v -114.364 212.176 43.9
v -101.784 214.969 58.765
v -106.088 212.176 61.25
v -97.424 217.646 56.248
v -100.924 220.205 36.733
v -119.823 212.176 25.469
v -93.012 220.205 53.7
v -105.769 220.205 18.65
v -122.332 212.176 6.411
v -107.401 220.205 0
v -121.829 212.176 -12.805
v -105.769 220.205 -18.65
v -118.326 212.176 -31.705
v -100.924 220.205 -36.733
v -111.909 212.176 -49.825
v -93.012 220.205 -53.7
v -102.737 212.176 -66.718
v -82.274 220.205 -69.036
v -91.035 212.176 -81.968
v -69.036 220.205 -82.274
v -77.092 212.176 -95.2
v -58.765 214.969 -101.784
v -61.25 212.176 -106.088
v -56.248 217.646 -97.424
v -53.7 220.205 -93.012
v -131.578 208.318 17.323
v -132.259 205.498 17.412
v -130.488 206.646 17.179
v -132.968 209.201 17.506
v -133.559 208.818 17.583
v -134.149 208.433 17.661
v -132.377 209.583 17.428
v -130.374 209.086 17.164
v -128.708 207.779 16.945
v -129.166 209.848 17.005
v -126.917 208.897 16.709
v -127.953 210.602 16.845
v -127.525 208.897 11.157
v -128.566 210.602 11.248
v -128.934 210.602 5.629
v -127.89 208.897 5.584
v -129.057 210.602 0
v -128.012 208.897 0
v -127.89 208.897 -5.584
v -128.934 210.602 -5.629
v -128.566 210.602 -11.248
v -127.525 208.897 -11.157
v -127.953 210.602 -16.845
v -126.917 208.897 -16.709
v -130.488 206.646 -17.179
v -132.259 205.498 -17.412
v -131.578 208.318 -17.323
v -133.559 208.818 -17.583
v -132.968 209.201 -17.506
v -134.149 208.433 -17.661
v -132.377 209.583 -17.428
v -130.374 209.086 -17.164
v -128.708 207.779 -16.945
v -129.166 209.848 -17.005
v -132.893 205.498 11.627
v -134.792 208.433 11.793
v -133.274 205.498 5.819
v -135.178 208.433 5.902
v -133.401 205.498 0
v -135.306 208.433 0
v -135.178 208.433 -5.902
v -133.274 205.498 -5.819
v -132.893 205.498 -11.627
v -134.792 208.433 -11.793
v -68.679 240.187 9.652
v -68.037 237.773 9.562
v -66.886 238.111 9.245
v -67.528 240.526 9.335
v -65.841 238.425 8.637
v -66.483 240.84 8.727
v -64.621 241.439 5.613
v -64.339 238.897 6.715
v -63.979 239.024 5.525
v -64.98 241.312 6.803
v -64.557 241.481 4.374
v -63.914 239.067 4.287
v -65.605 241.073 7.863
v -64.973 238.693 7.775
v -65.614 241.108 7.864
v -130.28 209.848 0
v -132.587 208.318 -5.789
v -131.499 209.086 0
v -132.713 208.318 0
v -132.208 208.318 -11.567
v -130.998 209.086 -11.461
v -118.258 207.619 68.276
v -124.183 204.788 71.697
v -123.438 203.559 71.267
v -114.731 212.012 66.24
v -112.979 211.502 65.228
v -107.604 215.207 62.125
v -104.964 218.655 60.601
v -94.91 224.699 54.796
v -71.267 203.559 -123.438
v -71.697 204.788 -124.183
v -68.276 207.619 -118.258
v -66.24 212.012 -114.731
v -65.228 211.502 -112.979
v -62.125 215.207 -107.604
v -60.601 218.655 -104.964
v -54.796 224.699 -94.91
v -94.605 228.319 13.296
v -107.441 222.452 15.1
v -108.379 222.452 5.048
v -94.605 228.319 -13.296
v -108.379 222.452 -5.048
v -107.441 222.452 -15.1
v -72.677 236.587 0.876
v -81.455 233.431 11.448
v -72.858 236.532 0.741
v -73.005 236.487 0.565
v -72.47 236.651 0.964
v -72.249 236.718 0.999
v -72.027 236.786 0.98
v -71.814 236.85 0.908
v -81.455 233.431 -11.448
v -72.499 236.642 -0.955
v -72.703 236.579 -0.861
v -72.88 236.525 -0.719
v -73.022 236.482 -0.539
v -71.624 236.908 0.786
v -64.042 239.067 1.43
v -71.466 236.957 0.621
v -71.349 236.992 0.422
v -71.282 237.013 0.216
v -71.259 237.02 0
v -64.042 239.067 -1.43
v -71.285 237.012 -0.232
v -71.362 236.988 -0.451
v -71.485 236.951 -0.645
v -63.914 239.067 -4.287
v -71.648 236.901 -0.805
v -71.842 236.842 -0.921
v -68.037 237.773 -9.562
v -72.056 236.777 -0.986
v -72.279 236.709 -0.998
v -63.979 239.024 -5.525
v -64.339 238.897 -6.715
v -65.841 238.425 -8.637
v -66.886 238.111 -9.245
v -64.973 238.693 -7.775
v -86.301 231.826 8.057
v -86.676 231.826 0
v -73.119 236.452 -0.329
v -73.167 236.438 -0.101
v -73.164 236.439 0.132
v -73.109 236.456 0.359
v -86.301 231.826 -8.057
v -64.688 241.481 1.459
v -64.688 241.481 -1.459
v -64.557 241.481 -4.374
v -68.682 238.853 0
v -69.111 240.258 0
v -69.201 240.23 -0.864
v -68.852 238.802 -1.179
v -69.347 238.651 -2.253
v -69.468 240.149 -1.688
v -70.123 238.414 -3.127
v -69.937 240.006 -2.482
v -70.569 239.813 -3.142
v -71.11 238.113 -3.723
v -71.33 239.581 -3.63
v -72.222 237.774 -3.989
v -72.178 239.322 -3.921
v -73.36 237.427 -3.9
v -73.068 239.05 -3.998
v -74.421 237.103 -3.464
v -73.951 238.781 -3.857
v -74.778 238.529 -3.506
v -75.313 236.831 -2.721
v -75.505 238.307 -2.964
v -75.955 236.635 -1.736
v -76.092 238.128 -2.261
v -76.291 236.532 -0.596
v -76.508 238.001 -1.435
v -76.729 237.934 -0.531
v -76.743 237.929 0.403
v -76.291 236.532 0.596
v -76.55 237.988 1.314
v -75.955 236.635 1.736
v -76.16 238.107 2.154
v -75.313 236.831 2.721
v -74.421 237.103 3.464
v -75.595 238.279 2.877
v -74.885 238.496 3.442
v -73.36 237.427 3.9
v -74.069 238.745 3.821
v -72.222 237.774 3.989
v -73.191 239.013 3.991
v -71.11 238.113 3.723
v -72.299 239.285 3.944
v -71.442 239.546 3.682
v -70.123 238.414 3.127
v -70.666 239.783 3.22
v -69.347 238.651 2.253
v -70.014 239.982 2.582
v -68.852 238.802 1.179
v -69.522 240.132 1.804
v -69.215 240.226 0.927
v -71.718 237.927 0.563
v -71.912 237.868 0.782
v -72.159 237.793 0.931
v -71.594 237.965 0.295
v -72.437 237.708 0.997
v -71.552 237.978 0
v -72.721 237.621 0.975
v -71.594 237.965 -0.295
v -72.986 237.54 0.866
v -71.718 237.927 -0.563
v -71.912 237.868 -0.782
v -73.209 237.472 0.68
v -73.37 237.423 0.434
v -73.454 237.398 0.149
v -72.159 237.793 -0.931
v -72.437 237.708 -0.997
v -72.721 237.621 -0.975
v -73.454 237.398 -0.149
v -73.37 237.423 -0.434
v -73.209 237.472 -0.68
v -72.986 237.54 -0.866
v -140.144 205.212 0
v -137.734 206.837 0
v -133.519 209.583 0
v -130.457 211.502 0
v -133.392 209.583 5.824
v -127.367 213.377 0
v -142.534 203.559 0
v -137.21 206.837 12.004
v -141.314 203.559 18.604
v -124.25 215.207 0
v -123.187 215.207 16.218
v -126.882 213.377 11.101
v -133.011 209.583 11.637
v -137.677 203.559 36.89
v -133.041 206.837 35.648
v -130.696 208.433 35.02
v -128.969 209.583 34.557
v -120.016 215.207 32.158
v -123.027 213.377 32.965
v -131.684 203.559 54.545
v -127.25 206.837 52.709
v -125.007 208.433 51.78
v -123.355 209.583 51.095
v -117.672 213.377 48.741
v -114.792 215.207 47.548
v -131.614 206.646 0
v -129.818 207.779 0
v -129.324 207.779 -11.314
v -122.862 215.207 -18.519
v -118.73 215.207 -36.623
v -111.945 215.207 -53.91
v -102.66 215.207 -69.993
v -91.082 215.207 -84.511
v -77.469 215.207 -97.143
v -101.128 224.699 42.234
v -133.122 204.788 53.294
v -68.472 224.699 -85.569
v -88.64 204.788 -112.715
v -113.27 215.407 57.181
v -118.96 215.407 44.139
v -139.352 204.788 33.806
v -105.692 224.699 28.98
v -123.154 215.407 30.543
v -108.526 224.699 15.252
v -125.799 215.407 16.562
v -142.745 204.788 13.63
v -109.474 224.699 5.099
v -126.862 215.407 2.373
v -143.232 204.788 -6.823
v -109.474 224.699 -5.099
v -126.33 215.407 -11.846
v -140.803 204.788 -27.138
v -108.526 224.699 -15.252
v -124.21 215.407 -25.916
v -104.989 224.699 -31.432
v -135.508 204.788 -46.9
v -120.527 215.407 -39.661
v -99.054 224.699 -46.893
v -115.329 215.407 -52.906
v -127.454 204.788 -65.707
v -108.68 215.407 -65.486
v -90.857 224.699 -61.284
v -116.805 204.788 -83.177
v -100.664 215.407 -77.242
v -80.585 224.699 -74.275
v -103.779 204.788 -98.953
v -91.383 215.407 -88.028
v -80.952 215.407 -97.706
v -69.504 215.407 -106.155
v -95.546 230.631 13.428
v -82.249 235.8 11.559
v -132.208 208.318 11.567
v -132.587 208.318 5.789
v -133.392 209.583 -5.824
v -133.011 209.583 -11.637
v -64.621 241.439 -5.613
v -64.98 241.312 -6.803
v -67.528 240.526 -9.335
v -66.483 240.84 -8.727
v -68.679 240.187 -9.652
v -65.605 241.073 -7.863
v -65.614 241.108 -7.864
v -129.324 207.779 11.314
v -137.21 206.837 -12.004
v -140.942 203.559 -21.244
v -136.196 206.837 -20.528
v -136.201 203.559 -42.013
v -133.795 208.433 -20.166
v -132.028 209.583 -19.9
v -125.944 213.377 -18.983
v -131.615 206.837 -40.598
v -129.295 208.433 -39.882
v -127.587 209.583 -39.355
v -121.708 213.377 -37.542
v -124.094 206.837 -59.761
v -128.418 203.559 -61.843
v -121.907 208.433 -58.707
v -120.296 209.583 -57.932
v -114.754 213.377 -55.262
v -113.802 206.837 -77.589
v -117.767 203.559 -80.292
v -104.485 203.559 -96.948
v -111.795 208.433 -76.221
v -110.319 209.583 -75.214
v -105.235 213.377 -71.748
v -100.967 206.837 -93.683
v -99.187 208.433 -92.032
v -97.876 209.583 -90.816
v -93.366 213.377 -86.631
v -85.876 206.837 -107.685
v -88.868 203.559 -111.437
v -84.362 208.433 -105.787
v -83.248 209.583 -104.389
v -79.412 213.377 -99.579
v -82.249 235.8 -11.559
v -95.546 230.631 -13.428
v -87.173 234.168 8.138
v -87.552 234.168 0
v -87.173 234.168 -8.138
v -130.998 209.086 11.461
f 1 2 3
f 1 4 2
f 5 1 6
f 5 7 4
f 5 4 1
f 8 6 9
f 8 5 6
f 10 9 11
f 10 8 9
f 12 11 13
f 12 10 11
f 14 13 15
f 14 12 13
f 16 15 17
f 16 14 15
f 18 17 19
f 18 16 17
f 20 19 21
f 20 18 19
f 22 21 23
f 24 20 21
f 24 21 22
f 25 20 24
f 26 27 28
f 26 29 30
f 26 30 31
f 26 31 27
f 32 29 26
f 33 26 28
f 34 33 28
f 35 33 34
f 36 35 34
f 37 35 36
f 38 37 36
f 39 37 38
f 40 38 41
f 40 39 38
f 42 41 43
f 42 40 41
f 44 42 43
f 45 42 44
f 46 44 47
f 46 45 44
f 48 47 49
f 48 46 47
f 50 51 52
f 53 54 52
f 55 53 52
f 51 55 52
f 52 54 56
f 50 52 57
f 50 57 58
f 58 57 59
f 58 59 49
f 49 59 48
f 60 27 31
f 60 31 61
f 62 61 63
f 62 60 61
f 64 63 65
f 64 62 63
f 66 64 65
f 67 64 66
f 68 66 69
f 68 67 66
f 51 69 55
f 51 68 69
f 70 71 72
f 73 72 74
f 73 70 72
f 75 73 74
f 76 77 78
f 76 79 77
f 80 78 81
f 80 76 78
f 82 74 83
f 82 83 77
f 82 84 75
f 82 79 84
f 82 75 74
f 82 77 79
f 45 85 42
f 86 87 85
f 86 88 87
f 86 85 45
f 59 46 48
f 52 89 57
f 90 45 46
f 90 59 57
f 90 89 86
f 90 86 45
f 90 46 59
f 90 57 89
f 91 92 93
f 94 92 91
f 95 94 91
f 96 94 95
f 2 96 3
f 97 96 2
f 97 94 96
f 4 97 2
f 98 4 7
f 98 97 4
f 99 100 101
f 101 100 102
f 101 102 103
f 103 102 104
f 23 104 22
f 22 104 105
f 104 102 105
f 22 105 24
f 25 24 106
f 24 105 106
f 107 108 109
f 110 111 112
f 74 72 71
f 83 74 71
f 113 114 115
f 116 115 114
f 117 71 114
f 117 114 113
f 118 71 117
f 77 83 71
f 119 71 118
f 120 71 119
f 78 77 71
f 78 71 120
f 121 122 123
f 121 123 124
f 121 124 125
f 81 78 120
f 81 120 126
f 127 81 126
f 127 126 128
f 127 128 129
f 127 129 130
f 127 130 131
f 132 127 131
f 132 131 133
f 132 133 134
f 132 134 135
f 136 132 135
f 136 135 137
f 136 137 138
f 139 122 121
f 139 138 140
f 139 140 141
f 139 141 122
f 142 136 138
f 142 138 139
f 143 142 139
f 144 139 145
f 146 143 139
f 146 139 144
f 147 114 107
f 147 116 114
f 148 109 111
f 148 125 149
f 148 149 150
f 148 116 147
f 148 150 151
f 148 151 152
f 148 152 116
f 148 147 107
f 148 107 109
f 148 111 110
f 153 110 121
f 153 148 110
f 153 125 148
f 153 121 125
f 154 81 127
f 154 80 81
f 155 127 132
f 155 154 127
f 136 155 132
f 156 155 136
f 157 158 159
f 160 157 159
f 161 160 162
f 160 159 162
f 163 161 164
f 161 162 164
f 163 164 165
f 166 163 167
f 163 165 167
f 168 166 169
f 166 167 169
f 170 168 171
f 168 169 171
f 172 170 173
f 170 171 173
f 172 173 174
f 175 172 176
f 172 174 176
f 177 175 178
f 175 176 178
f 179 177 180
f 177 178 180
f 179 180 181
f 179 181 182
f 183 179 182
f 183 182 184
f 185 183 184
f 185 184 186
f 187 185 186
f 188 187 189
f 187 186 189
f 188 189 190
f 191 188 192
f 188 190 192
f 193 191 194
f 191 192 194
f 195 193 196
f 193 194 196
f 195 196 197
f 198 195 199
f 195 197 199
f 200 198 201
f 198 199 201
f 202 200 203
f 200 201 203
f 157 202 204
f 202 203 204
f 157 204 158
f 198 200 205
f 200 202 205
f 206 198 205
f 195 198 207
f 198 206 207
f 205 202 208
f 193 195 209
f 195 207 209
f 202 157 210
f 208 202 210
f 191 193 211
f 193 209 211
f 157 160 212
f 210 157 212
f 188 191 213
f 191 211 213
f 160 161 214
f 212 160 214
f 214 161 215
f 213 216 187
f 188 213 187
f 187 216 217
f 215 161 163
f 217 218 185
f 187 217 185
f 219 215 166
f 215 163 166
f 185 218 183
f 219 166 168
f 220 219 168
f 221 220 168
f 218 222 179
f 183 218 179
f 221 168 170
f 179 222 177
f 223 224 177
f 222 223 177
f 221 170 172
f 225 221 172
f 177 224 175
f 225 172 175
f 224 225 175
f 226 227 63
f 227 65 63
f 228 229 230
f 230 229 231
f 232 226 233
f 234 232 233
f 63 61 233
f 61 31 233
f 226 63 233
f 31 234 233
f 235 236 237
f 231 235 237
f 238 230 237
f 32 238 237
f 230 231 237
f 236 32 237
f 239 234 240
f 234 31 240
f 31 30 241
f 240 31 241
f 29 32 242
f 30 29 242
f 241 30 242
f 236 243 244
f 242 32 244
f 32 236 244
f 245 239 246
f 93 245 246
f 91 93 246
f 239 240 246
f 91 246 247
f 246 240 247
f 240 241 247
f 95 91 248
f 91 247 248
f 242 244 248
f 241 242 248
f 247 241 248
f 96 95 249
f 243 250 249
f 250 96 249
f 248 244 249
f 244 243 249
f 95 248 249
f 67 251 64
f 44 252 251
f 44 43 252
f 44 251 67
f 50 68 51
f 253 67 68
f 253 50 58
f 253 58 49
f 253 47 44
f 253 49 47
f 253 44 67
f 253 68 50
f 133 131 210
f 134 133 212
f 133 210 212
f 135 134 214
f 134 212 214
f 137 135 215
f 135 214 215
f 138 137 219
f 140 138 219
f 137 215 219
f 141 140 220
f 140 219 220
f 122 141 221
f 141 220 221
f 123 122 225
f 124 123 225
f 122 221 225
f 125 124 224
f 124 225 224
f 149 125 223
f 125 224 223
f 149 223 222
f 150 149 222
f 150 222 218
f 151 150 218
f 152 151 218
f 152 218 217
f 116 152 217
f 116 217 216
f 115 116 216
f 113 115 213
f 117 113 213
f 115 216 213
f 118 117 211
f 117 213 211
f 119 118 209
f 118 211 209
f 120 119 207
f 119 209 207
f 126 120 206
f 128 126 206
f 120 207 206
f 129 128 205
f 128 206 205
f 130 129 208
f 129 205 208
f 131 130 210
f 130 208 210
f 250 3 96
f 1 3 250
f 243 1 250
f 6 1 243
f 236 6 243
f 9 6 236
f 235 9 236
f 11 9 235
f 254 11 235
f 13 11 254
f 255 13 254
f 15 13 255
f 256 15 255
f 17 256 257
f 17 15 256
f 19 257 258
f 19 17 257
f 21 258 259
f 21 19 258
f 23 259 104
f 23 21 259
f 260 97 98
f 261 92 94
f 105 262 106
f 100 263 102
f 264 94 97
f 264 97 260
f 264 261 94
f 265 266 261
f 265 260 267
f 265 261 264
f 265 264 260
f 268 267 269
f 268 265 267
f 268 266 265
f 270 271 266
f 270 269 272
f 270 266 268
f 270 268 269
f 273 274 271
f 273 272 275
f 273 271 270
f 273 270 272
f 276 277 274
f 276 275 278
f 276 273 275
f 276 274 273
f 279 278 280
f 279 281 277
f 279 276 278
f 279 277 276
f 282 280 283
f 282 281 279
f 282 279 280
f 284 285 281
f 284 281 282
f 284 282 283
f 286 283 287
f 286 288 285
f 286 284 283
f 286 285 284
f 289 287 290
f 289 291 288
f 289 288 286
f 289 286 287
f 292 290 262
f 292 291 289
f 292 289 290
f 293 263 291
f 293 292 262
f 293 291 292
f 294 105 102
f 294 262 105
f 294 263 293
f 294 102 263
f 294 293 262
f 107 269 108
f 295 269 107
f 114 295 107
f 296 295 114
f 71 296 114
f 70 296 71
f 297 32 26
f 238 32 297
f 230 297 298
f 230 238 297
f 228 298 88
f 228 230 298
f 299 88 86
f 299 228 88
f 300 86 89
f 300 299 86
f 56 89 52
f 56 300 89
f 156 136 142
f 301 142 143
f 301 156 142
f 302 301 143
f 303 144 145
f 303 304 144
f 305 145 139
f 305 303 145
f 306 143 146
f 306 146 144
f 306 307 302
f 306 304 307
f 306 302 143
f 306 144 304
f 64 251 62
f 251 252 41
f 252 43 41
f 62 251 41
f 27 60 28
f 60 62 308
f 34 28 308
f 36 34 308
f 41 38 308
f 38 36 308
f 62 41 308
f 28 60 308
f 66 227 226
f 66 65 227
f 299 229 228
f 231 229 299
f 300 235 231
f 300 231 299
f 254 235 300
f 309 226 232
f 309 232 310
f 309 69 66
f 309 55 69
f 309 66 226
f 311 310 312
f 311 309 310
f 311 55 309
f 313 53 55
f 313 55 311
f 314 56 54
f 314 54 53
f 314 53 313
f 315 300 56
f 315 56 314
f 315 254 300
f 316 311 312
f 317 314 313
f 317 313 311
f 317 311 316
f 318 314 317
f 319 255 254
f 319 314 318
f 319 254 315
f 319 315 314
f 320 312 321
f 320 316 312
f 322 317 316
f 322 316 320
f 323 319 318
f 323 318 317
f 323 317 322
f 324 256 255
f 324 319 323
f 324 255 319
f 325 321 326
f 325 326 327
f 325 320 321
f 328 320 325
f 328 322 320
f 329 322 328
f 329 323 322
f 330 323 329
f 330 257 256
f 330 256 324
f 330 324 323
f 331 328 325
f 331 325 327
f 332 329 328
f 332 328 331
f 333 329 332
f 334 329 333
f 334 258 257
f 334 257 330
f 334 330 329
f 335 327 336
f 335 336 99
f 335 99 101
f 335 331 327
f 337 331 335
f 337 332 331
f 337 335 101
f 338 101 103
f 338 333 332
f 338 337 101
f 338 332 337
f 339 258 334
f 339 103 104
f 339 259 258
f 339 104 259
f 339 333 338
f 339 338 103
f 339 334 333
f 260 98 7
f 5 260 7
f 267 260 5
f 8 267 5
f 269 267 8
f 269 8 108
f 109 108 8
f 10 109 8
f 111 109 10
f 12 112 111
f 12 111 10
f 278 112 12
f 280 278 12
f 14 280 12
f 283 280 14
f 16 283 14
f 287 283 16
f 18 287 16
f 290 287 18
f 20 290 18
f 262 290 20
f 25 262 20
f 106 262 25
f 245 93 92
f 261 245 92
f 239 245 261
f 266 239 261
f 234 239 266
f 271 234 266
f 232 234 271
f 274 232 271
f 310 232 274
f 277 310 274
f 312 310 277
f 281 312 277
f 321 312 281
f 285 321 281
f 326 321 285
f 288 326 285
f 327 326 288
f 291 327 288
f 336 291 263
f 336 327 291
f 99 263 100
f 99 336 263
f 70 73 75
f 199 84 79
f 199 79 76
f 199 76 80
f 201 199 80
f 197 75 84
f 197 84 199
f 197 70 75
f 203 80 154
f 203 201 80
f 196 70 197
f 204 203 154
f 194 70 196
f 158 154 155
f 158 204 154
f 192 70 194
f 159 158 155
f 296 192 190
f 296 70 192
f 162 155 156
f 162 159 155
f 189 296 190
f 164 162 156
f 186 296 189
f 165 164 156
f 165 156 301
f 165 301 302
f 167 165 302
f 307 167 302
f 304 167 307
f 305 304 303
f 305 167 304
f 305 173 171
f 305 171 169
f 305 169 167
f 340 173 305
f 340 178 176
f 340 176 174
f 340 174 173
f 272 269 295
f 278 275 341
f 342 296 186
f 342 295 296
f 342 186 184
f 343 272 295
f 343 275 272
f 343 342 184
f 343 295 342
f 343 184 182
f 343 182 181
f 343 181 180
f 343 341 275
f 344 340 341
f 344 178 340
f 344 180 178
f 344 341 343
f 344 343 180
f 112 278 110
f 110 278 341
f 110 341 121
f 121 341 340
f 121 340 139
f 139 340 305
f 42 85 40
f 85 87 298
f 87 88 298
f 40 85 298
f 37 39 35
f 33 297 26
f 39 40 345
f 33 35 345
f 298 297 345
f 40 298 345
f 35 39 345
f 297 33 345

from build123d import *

# Parameters (mm, degrees)
REVOLVE1_ANGLE           = 30
REVOLVE1_OTHER_WAY_ANGLE = 60
REVOLVE2_ANGLE           = 8
REVOLVE2_OTHER_WAY_ANGLE = 8
FILLET1_R                = 5
REVOLVE3_ANGLE           = 7.5
REVOLVE3_OTHER_WAY_ANGLE = 7.5


with BuildPart() as part:
    # Sketch2 → Revolve1 (revolve)
    with BuildSketch(Plane.XY):
        with BuildLine():
            Line((-124.25, 215.20731284), (-122.5, 212.176223927))
            ThreePointArc((-122.5, 212.176223927), (-115.020532883, 216.32216025), (-107.400930963, 220.204541343))
            Line((-107.400930963, 220.204541343), (-109.592786697, 224.698511575))
            ThreePointArc((-109.592786697, 224.698511575), (-126.88459074, 215.40729011), (-143.394109088, 204.788011072))
            Line((-143.394109088, 204.788011072), (-142.533744433, 203.559283006))
            ThreePointArc((-142.533744433, 203.559283006), (-133.518952674, 209.582774285), (-124.25, 215.20731284))
        make_face()
    revolve(axis=Axis((0, 0, 0), (0, 1, 0)), revolution_arc=REVOLVE1_ANGLE)

    # Sketch2 → Revolve1 other way (revolve)
    with BuildSketch(Plane.XY):
        with BuildLine():
            Line((-124.25, 215.20731284), (-122.5, 212.176223927))
            ThreePointArc((-122.5, 212.176223927), (-115.020532883, 216.32216025), (-107.400930963, 220.204541343))
            Line((-107.400930963, 220.204541343), (-109.592786697, 224.698511575))
            ThreePointArc((-109.592786697, 224.698511575), (-126.88459074, 215.40729011), (-143.394109088, 204.788011072))
            Line((-143.394109088, 204.788011072), (-142.533744433, 203.559283006))
            ThreePointArc((-142.533744433, 203.559283006), (-133.518952674, 209.582774285), (-124.25, 215.20731284))
        make_face()
    revolve(axis=Axis((0, 0, 0), (0, -1, 0)), revolution_arc=REVOLVE1_OTHER_WAY_ANGLE)

    # Sketch3 → Revolve2 (revolve)
    with BuildSketch(Plane.XY):
        with BuildLine():
            ThreePointArc((-108.49685883, 222.451526459), (-86.676326862, 231.826366839), (-64.057713663, 239.066642007))
            Line((-64.057713663, 239.066642007), (-64.704761276, 241.481456572))
            ThreePointArc((-64.704761276, 241.481456572), (-87.551845315, 234.168047312), (-109.592786697, 224.698511575))
            Line((-109.592786697, 224.698511575), (-108.49685883, 222.451526459))
        make_face()
    revolve(axis=Axis((0, 0, 0), (0, 1, 0)), revolution_arc=REVOLVE2_ANGLE)

    # Sketch3 → Revolve2 other way (revolve)
    with BuildSketch(Plane.XY):
        with BuildLine():
            ThreePointArc((-108.49685883, 222.451526459), (-86.676326862, 231.826366839), (-64.057713663, 239.066642007))
            Line((-64.057713663, 239.066642007), (-64.704761276, 241.481456572))
            ThreePointArc((-64.704761276, 241.481456572), (-87.551845315, 234.168047312), (-109.592786697, 224.698511575))
            Line((-109.592786697, 224.698511575), (-108.49685883, 222.451526459))
        make_face()
    revolve(axis=Axis((0, 0, 0), (0, -1, 0)), revolution_arc=REVOLVE2_OTHER_WAY_ANGLE)

    # Fillet1
    fillet1_edges = [part.edges().sort_by_distance(p)[0] for p in [
        (-63.754683692, 240.274049289, -8.960136462),
        (-63.754683692, 240.274049289, 8.960136462),
    ]]
    fillet(fillet1_edges, radius=FILLET1_R)

    # Sketch4 → Cut-Revolve1 (revolve, cut)
    with BuildSketch(Plane.XY):
        Polygon((-75.028736809, 245.948635315), (-72.508257021, 237.68635355), (-71.551772701, 237.97813728), (-74.110273038, 246.365052654), align=None)
        Polygon((-74.110273038, 246.365052654), (-71.551772701, 237.97813728), (-68.682319741, 238.853488471), (-71.354881726, 247.614304673), align=None)
        with BuildLine():
            Line((-72.508257021, 237.68635355), (-58.356746094, 191.296864024))
            ThreePointArc((-58.356746094, 191.296864024), (-57.878320073, 191.442158538), (-57.39953231, 191.586256529))
            Line((-57.39953231, 191.586256529), (-71.551772701, 237.97813728))
            Line((-71.551772701, 237.97813728), (-72.508257021, 237.68635355))
        make_face()
    revolve(axis=Axis((0, 0, 0), (-0.2917837304684816, 0.9564843201192044, 0)), mode=Mode.SUBTRACT)

    # Sketch7 → Revolve3 (revolve)
    with BuildSketch(Plane.XY):
        with BuildLine():
            ThreePointArc((-133.400699518, 205.497575091), (-130.717474001, 207.214724358), (-128.012148355, 208.896840267))
            Line((-128.012148355, 208.896840267), (-129.057145485, 210.602120595))
            ThreePointArc((-129.057145485, 210.602120595), (-130.890058266, 209.467879751), (-132.713003262, 208.317687116))
            Line((-132.713003262, 208.317687116), (-133.518952674, 209.582774285))
            ThreePointArc((-133.518952674, 209.582774285), (-134.41391709, 209.009925345), (-135.306423797, 208.433254735))
            Line((-135.306423797, 208.433254735), (-133.400699518, 205.497575091))
        make_face()
    revolve(axis=Axis((0, 0, 0), (0, 1, 0)), revolution_arc=REVOLVE3_ANGLE)

    # Sketch7 → Revolve3 other way (revolve)
    with BuildSketch(Plane.XY):
        with BuildLine():
            ThreePointArc((-133.400699518, 205.497575091), (-130.717474001, 207.214724358), (-128.012148355, 208.896840267))
            Line((-128.012148355, 208.896840267), (-129.057145485, 210.602120595))
            ThreePointArc((-129.057145485, 210.602120595), (-130.890058266, 209.467879751), (-132.713003262, 208.317687116))
            Line((-132.713003262, 208.317687116), (-133.518952674, 209.582774285))
            ThreePointArc((-133.518952674, 209.582774285), (-134.41391709, 209.009925345), (-135.306423797, 208.433254735))
            Line((-135.306423797, 208.433254735), (-133.400699518, 205.497575091))
        make_face()
    revolve(axis=Axis((0, 0, 0), (0, -1, 0)), revolution_arc=REVOLVE3_OTHER_WAY_ANGLE)


solid = part.part
